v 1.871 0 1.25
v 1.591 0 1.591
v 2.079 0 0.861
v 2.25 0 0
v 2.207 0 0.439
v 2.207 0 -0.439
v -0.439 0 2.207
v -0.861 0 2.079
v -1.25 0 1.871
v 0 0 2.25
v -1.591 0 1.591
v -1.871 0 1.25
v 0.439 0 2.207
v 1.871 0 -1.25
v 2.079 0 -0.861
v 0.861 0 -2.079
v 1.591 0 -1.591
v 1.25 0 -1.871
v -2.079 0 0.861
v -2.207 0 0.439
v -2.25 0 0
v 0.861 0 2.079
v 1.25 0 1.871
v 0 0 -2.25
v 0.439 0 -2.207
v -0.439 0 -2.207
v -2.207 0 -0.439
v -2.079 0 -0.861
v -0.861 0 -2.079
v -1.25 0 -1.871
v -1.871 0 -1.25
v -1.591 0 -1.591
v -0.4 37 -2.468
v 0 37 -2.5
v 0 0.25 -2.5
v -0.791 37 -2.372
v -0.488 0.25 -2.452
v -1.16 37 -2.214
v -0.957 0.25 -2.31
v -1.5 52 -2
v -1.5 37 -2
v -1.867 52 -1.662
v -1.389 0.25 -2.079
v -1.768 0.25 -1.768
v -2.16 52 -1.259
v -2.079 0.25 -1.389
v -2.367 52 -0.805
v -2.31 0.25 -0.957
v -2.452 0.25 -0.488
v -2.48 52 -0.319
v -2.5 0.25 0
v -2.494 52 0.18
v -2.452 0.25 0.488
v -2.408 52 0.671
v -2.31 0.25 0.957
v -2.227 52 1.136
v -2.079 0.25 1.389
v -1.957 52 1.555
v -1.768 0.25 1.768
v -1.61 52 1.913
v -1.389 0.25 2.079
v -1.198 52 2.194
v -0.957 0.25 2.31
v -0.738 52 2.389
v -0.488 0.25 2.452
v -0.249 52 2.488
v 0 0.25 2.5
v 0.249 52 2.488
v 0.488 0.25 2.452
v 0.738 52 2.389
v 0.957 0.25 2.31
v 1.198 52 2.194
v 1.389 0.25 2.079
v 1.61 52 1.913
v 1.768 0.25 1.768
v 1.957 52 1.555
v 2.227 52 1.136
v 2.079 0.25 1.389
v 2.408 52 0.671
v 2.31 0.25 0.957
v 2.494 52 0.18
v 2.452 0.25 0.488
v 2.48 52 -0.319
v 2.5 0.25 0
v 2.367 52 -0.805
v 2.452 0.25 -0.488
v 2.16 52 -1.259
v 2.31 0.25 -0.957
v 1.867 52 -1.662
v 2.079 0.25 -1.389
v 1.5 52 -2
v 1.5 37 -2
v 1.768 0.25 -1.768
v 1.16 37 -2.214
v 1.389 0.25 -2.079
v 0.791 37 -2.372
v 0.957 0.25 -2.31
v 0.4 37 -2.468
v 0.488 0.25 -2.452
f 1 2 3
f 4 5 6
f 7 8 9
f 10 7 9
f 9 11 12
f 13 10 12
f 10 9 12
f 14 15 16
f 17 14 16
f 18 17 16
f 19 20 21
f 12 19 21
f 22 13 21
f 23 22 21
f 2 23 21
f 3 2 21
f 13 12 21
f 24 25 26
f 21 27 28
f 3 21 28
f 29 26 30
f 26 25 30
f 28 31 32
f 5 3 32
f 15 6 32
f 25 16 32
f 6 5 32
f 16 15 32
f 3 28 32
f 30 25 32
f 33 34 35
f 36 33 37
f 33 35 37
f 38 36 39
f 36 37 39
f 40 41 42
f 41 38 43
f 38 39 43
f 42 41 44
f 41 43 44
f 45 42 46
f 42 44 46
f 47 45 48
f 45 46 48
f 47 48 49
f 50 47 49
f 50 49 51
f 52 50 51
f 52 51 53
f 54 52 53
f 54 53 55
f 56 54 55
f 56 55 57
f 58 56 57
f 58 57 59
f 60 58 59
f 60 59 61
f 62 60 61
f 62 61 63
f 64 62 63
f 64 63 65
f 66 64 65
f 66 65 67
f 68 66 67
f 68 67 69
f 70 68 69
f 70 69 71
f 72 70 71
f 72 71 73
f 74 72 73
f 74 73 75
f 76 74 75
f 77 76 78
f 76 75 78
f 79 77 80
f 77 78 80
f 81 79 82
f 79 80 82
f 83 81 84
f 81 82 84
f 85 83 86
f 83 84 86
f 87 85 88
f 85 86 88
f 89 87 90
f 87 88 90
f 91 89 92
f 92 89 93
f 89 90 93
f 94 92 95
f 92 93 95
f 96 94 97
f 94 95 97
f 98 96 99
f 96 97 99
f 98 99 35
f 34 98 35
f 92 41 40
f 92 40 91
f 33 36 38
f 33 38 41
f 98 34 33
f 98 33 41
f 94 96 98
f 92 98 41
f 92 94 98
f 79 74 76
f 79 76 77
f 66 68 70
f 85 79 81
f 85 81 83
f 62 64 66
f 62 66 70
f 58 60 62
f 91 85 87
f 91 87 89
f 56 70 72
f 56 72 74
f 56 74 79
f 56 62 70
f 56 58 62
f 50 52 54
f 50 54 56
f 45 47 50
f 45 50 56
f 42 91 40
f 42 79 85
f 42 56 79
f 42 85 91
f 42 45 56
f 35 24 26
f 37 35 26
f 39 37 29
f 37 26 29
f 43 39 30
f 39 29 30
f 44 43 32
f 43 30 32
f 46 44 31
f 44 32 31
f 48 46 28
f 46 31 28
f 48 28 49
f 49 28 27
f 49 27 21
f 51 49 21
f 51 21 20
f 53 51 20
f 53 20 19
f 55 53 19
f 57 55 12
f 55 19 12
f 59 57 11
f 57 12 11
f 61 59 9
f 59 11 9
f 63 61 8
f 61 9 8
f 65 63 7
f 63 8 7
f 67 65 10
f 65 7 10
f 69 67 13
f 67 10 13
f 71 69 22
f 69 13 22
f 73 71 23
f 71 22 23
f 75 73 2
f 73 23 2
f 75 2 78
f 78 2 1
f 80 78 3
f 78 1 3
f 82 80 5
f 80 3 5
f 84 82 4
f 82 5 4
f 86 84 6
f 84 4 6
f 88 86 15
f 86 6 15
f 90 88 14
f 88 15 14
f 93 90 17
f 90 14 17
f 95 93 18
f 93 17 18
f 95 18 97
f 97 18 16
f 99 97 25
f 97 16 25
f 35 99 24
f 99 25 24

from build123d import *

# Parameters (mm, degrees)
SKETCH_1_R          = 2.5
EXTRUDE_1_DEPTH     = 52
CUT_EXTRUDE_START   = 37
CUT_EXTRUDE_1_DEPTH = 15
CHAMFER_1_SIZE      = 0.25


with BuildPart() as part:
    # 草图1 → 凸台-拉伸1 (new body)
    with BuildSketch(Plane(origin=(0, 0, 0), x_dir=(1, 0, 0), z_dir=(0, 1, 0))):
        with Locations(Location((0, 0, 0), (0, 0, 90))):
            Circle(SKETCH_1_R)
    extrude(amount=EXTRUDE_1_DEPTH)

    # 草图2 → 切除-拉伸1 (cut)
    with BuildSketch(Plane(origin=(0, 0, 0), x_dir=(1, 0, 0), z_dir=(0, 1, 0)).offset(CUT_EXTRUDE_START)):
        with BuildLine():
            Line((-1.5, 2), (1.5, 2))
            ThreePointArc((1.5, 2), (0, 2.5), (-1.5, 2))
        make_face()
    extrude(amount=CUT_EXTRUDE_1_DEPTH, mode=Mode.SUBTRACT)

    # 倒角1
    chamfer_1_edges = [part.edges().sort_by_distance(p)[0] for p in [
        (0, 0, 2.5),
    ]]
    chamfer(chamfer_1_edges, length=CHAMFER_1_SIZE)


solid = part.part
